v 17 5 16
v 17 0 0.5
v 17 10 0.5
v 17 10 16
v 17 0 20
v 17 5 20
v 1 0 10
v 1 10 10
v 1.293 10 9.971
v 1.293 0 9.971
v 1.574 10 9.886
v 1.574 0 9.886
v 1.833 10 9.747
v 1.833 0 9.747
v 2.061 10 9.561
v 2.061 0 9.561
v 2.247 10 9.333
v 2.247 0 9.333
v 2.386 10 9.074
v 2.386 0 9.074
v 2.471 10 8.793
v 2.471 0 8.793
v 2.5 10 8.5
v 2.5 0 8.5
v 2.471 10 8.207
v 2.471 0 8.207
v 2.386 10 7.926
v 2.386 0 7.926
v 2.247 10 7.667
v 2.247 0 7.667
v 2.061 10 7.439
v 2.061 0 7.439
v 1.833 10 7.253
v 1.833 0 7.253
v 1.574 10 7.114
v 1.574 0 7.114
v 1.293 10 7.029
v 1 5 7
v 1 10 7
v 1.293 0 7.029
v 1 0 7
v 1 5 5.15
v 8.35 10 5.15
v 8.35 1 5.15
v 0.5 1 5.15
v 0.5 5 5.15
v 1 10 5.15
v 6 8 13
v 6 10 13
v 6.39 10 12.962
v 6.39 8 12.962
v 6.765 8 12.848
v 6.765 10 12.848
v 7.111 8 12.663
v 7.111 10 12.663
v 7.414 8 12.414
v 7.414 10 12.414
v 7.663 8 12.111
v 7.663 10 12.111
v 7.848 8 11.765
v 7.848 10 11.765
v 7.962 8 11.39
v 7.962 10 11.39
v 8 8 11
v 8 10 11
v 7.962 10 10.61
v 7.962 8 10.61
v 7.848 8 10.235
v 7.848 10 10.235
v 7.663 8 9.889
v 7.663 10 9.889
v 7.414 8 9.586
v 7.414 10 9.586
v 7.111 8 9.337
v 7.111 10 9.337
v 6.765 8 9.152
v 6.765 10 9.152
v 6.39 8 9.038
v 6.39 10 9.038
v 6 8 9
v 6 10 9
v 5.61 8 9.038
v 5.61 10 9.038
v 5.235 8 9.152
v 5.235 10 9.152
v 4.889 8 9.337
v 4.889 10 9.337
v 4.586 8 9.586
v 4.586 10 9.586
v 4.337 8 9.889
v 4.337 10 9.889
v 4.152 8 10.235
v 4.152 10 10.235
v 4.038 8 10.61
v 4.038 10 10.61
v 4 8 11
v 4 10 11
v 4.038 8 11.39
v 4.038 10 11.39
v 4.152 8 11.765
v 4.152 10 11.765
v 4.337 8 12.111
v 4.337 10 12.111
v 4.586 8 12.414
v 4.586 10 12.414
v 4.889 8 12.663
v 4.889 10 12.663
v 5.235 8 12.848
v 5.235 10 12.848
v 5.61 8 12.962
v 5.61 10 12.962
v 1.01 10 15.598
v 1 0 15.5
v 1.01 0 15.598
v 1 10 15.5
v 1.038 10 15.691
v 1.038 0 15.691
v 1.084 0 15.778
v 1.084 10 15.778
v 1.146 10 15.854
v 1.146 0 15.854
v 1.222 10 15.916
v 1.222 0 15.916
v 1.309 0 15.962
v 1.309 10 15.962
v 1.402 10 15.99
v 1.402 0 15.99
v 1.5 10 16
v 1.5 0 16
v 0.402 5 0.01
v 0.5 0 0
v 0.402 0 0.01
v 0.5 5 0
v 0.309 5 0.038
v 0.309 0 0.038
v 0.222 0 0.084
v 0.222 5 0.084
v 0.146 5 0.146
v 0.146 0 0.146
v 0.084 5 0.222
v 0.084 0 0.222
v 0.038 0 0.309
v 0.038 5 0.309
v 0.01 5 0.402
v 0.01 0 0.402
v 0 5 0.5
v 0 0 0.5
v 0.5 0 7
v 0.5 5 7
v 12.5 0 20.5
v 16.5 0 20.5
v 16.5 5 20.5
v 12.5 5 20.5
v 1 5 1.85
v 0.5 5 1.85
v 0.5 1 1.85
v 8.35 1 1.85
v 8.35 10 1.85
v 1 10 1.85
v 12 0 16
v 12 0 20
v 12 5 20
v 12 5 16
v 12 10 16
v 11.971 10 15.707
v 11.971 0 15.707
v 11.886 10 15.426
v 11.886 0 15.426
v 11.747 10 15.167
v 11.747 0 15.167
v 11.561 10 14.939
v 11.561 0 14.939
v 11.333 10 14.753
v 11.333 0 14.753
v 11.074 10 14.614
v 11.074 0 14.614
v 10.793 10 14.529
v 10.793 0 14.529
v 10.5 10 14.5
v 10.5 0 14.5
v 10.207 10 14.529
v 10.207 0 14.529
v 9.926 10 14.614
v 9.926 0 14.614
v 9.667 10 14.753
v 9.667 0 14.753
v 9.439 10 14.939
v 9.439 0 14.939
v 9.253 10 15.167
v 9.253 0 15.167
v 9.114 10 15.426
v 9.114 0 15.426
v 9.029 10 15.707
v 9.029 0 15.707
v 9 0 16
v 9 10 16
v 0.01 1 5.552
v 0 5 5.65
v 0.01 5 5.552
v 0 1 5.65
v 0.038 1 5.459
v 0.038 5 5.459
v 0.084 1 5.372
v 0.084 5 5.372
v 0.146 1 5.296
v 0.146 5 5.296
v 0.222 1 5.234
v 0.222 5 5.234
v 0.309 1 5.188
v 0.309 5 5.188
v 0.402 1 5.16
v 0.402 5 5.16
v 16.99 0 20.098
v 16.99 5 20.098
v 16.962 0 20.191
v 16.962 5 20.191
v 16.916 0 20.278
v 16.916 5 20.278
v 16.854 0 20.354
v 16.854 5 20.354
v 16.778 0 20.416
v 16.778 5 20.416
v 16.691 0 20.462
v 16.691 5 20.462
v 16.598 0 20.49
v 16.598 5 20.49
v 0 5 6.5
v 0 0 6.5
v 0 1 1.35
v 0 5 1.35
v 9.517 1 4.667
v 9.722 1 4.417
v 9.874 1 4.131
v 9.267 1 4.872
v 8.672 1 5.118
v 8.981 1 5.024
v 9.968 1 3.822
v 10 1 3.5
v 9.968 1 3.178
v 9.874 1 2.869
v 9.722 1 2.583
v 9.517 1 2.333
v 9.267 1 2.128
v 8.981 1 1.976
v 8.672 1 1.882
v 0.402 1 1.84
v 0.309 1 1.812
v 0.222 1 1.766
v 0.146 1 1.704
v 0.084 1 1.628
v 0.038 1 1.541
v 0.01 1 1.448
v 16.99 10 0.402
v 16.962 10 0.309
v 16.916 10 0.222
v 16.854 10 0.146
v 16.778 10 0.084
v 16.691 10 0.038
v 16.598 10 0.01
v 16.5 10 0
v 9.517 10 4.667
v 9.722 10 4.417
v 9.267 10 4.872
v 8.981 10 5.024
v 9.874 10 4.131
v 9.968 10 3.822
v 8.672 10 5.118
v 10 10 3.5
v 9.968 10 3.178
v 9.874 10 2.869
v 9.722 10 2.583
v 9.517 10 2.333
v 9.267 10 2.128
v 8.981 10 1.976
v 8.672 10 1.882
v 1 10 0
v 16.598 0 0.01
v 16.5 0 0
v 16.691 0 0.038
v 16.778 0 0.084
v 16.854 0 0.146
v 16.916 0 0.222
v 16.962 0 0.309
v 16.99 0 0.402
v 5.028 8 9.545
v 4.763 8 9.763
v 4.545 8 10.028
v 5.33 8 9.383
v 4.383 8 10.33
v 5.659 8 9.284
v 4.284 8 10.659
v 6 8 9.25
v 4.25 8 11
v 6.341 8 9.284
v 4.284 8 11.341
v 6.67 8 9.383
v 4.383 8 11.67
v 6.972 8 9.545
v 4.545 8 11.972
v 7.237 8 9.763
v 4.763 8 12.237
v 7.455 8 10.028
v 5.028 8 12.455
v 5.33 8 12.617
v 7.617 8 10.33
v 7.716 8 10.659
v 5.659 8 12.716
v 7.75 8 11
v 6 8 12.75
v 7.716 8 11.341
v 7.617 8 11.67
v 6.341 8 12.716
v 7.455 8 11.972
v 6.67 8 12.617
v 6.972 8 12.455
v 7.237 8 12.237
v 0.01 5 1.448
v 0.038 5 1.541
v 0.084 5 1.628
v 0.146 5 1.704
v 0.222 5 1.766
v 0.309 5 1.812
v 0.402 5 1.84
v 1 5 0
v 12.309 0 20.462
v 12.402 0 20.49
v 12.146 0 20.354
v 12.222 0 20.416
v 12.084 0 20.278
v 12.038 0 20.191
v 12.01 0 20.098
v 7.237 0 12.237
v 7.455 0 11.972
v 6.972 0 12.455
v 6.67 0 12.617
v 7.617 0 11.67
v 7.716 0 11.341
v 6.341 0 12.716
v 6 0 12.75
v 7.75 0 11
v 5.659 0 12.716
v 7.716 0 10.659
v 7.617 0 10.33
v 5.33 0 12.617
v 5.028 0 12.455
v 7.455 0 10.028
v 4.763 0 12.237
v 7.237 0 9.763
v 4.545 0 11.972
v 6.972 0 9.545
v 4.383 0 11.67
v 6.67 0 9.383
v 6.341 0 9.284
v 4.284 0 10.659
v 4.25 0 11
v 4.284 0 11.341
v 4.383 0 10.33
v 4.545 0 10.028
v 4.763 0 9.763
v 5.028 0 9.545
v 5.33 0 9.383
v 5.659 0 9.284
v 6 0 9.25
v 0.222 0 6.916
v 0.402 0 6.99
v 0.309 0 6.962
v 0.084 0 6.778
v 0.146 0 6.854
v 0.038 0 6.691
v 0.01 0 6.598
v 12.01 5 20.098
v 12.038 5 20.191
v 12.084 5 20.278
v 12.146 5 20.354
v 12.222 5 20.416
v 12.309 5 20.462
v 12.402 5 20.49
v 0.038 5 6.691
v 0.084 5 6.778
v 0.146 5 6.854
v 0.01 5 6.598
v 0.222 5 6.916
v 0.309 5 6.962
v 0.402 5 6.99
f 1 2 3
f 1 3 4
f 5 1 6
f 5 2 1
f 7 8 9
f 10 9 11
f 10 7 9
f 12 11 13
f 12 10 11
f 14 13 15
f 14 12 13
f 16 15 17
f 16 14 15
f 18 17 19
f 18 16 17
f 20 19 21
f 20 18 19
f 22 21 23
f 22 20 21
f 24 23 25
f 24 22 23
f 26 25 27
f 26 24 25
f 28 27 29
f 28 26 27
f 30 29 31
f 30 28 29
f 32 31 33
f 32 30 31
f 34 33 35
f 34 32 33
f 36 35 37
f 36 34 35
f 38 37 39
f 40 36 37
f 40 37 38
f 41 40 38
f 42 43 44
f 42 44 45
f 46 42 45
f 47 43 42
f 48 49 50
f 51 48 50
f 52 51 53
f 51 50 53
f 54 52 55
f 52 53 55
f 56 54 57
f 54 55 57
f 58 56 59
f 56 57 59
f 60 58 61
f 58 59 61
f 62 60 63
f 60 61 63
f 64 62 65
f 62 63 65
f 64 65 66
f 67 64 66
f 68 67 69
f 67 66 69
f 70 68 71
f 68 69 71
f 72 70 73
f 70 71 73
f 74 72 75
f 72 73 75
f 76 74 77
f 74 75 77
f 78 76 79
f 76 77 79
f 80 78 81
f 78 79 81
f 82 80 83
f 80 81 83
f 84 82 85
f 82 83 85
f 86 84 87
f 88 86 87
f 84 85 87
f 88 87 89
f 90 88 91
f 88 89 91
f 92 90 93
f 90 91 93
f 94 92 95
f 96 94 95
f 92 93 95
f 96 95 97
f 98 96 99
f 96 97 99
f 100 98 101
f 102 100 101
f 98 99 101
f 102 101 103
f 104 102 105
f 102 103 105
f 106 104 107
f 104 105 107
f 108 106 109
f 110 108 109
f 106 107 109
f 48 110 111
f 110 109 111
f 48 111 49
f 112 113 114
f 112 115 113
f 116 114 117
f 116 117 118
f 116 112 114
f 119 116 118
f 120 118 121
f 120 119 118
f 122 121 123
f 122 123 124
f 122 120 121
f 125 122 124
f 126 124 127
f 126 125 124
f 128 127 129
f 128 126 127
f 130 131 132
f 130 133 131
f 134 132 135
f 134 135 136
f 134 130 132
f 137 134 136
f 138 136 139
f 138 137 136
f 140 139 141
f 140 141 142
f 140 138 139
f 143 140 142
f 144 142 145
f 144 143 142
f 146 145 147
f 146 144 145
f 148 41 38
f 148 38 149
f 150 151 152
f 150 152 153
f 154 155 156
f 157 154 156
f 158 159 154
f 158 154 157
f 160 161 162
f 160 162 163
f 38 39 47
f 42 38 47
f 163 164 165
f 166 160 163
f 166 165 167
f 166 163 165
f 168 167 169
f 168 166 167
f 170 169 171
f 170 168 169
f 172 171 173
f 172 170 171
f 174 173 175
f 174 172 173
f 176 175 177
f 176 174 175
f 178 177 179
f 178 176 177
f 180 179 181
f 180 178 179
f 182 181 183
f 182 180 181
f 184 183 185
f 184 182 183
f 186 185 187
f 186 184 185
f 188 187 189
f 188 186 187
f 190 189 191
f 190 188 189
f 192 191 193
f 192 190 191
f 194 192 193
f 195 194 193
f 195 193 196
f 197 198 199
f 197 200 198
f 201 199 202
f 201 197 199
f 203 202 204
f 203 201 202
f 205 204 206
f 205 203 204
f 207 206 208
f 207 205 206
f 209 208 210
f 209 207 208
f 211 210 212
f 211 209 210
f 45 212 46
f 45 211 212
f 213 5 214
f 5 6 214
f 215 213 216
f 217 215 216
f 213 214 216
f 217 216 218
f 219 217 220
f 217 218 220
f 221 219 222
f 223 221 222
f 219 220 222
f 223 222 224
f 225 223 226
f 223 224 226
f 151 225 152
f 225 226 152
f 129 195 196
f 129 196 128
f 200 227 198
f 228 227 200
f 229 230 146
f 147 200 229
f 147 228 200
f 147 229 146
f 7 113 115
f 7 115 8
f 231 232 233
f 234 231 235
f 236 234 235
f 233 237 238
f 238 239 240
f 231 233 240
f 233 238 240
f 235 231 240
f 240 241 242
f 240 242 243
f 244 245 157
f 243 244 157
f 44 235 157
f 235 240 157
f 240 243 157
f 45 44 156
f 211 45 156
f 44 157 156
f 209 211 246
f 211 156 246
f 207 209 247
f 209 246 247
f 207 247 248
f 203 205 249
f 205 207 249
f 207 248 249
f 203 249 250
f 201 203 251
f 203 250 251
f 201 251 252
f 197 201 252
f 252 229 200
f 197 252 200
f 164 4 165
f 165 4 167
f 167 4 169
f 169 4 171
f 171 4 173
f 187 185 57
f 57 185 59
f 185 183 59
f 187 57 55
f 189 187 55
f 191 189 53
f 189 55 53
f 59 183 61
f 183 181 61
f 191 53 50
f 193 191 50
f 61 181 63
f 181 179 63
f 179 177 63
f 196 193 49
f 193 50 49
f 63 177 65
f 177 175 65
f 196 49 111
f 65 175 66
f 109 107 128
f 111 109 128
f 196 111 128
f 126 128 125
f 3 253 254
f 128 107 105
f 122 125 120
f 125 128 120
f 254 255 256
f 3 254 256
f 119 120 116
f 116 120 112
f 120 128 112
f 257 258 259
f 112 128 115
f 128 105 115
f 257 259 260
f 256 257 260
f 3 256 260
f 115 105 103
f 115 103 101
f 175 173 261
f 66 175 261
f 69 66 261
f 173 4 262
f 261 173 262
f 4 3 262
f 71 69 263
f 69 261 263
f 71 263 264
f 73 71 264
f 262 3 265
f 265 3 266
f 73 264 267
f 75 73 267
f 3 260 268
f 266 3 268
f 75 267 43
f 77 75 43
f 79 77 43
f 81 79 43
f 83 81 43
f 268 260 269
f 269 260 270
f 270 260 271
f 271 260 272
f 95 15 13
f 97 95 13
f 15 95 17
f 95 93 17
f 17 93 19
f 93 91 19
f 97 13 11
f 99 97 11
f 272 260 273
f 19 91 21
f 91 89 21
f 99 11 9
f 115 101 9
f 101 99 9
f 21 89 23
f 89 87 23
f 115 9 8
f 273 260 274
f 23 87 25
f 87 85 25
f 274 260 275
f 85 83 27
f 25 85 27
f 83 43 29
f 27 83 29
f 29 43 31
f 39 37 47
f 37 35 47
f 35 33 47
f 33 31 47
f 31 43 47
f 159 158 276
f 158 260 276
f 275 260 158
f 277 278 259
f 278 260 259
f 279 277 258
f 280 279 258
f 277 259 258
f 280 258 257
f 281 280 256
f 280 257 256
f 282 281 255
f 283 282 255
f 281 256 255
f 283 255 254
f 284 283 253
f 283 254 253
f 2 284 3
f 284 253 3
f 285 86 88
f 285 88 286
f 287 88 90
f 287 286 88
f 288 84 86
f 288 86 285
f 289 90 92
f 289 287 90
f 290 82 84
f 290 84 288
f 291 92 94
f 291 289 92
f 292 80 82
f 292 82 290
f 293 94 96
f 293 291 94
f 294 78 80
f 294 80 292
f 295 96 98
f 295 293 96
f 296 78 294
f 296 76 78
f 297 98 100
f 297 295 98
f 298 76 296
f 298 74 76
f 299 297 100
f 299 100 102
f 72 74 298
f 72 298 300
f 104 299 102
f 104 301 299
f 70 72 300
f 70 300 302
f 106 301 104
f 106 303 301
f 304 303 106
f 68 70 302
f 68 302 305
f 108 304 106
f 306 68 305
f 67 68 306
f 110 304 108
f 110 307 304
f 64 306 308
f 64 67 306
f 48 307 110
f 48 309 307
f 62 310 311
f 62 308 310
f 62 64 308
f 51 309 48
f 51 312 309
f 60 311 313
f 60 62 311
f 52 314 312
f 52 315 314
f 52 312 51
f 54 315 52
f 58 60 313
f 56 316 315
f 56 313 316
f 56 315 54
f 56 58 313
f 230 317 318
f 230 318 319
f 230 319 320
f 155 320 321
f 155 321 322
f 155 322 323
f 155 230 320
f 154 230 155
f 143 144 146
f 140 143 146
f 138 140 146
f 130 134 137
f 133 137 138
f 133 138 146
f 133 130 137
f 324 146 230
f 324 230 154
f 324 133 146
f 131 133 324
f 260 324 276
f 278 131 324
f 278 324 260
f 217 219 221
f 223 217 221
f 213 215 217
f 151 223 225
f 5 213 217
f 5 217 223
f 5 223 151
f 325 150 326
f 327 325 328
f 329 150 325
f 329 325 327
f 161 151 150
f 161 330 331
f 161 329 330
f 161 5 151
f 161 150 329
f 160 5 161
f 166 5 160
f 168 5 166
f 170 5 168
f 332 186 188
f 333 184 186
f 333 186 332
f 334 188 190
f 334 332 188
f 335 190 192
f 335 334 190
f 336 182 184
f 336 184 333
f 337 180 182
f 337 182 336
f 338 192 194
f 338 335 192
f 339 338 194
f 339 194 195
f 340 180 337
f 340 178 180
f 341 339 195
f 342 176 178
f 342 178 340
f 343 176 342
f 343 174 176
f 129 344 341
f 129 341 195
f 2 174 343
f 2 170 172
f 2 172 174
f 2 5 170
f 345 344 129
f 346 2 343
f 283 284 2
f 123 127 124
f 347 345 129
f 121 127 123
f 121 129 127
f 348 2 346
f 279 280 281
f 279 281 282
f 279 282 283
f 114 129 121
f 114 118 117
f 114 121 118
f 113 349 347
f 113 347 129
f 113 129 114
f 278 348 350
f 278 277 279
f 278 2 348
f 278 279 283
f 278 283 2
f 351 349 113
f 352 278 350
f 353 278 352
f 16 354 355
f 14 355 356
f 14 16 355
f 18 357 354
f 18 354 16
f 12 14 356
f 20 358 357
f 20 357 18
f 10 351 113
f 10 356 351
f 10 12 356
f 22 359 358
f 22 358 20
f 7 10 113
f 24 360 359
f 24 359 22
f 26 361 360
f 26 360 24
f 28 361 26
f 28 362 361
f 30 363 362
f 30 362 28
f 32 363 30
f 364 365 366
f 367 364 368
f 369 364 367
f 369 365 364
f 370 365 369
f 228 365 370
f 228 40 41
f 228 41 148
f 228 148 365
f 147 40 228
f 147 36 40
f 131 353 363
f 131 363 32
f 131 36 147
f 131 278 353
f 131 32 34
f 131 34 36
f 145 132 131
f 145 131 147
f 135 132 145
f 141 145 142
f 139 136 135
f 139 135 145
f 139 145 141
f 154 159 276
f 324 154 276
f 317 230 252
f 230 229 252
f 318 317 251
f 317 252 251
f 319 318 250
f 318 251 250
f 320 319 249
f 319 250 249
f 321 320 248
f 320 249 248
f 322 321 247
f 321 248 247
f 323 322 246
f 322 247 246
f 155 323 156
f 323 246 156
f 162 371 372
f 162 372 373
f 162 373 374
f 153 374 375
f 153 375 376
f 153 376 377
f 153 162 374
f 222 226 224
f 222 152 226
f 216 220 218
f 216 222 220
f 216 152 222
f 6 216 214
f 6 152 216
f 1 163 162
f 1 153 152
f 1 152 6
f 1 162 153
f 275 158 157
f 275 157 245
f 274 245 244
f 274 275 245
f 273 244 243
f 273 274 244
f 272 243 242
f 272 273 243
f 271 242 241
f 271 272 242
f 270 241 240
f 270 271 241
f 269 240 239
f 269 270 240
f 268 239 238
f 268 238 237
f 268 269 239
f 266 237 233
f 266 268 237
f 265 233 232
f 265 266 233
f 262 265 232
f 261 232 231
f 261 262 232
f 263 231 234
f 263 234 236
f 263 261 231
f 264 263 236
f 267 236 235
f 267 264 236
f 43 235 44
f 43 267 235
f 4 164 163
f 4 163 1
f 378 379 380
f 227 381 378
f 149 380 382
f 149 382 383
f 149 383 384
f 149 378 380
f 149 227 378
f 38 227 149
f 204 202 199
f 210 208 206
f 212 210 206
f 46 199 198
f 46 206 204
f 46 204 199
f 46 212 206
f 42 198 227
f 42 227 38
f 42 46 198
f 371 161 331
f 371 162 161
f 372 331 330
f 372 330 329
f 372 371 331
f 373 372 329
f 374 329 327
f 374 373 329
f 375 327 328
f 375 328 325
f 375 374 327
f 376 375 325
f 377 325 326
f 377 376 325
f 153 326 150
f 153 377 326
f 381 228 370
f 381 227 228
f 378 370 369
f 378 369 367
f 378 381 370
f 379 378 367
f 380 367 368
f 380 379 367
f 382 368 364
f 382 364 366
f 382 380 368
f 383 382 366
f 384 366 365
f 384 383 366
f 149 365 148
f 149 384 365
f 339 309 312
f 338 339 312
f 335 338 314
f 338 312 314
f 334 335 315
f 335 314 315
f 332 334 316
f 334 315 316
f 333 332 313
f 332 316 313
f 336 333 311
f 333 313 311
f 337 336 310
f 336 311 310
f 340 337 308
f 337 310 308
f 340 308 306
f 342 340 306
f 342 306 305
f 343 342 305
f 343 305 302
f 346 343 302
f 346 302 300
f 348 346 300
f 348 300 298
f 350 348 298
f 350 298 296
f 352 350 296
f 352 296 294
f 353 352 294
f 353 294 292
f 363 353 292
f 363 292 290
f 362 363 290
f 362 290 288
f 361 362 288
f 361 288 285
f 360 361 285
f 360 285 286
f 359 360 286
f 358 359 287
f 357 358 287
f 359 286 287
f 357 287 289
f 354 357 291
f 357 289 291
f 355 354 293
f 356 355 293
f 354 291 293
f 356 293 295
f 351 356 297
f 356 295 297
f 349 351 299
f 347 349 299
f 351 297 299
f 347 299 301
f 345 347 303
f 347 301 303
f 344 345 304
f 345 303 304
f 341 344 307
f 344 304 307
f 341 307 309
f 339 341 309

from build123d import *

# Parameters (mm, degrees)
BOSS_EXTRUDE1_DEPTH = 10
SKETCH4_R           = 1.75
CUT_EXTRUDE3_DEPTH  = 10
SKETCH6_R           = 2
CUT_EXTRUDE5_DEPTH  = 2
CUT_EXTRUDE6_DEPTH  = 29.447319733
SKETCH8_W           = 5
SKETCH8_H           = 4.5
SKETCH8_W_2         = 1
SKETCH8_H_2         = 7
CUT_EXTRUDE7_DEPTH  = 5
CUT_EXTRUDE8_DEPTH  = 9
FILLET6_R           = 0.5


with BuildPart() as part:
    # Sketch1 → Boss-Extrude1 (new body)
    with BuildSketch(Plane(origin=(0, 0, 0), x_dir=(1, 0, 0), z_dir=(0, 1, 0))):
        Polygon((0, 0), (17, 0), (17, -20.5), (12, -20.5), (12, -16), (1, -16), (1, -7), (0, -7), align=None)
    extrude(amount=BOSS_EXTRUDE1_DEPTH)

    # Sketch4 → Cut-Extrude3 (cut)
    with BuildSketch(Plane(origin=(0, 10, 0), x_dir=(1, 0, 0), z_dir=(0, 1, 0))):
        with Locations(Location((6, -11, 0), (0, 0, 270))):
            Circle(SKETCH4_R)
    extrude(amount=-CUT_EXTRUDE3_DEPTH, mode=Mode.SUBTRACT)

    # Sketch6 → Cut-Extrude5 (cut)
    with BuildSketch(Plane(origin=(0, 10, 0), x_dir=(1, 0, 0), z_dir=(0, 1, 0))):
        with Locations(Location((6, -11, 0), (0, 0, 270))):
            Circle(SKETCH6_R)
    extrude(amount=-CUT_EXTRUDE5_DEPTH, mode=Mode.SUBTRACT)

    # Sketch7 → Cut-Extrude6 (cut, through all)
    with BuildSketch(Plane.XZ):
        with BuildLine():
            Line((0, 10), (1, 10))
            ThreePointArc((1, 10), (2.5, 8.5), (1, 7))
            Line((1, 7), (0, 7))
            ThreePointArc((0, 7), (-1.5, 8.5), (0, 10))
        make_face()
        with BuildLine():
            Line((9, 16), (9, 20.5))
            ThreePointArc((9, 20.5), (10.5, 22), (12, 20.5))
            Line((12, 20.5), (12, 16))
            ThreePointArc((12, 16), (10.5, 14.5), (9, 16))
        make_face()
    extrude(amount=-CUT_EXTRUDE6_DEPTH, mode=Mode.SUBTRACT)

    # Sketch8 → Cut-Extrude7 (cut)
    with BuildSketch(Plane(origin=(0, 10, 0), x_dir=(1, 0, 0), z_dir=(0, 1, 0))):
        with Locations((14.5, -18.25)):
            Rectangle(SKETCH8_W, SKETCH8_H)
        with Locations((0.5, -3.5)):
            Rectangle(SKETCH8_W_2, SKETCH8_H_2)
    extrude(amount=-CUT_EXTRUDE7_DEPTH, mode=Mode.SUBTRACT)

    # Sketch9 → Cut-Extrude8 (cut)
    with BuildSketch(Plane(origin=(0, 10, 0), x_dir=(1, 0, 0), z_dir=(0, 1, 0))):
        with BuildLine():
            Line((8.35, -5.15), (0, -5.15))
            ThreePointArc((0, -5.15), (-1.65, -3.5), (0, -1.85))
            Line((0, -1.85), (8.35, -1.85))
            ThreePointArc((8.35, -1.85), (10, -3.5), (8.35, -5.15))
        make_face()
    extrude(amount=-CUT_EXTRUDE8_DEPTH, mode=Mode.SUBTRACT)

    # Fillet6
    fillet6_edges = [part.edges().sort_by_distance(p)[0] for p in [
        (0, 3, 1.85),
        (0, 3, 5.15),
        (1, 5, 16),
        (17, 5, 0),
        (17, 2.5, 20.5),
        (12, 2.5, 20.5),
        (0, 2.5, 7),
        (0, 2.5, 0),
    ]]
    fillet(fillet6_edges, radius=FILLET6_R)


solid = part.part
